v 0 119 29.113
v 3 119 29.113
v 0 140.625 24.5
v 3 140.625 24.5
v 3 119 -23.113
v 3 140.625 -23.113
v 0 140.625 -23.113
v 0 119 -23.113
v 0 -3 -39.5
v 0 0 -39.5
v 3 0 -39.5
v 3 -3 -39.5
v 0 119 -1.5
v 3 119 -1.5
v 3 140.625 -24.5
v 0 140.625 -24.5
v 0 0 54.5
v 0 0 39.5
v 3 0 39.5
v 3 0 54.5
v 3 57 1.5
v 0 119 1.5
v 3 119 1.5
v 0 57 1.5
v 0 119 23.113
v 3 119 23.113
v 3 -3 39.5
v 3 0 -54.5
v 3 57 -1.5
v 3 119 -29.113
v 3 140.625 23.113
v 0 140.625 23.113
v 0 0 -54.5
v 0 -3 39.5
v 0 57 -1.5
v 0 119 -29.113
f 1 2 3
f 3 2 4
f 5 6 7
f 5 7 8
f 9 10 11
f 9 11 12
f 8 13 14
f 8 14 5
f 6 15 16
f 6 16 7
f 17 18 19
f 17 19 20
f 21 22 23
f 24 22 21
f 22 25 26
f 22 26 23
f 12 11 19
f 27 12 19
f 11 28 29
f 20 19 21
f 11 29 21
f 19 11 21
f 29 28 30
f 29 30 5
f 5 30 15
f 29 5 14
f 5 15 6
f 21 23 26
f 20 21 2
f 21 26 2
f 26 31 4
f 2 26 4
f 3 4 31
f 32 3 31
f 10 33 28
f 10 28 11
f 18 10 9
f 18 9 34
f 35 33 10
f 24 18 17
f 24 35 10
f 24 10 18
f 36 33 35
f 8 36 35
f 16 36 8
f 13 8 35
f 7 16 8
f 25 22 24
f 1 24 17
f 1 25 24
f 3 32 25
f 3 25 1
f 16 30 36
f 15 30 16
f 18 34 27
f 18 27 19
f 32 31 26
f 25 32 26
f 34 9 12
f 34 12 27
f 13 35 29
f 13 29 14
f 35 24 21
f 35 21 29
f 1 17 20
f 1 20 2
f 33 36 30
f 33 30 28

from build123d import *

# Parameters (mm, degrees)
EXTRUDE_1_DEPTH     = 3
BOSS_EXTRUDE1_DEPTH = 3


with BuildPart() as part:
    # Эскиз1 → Бобышка-Вытянуть1 (new body)
    with BuildSketch(Plane(origin=(0, 0, 0), x_dir=(0, 0, -1), z_dir=(1, 0, 0))):
        Polygon((29.113333333, 119), (54.5, 0), (39.5, 0), (39.5, -3), (-39.5, -3), (-39.5, 0), (-54.5, 0), (-29.113333333, 119), (-1.5, 119), (-1.5, 57), (1.5, 57), (1.5, 119), align=None)
    extrude(amount=EXTRUDE_1_DEPTH)

    # Sketch1 → Boss-Extrude1 (add)
    with BuildSketch(Plane(origin=(3, 0, 0), x_dir=(0, 0, -1), z_dir=(1, 0, 0))):
        Polygon((-29.113333333, 119), (-24.5, 140.625), (-23.113333333, 140.625), (-23.113333333, 119), align=None)
        Polygon((29.113333333, 119), (24.5, 140.625), (23.113333333, 140.625), (23.113333333, 119), align=None)
    extrude(amount=-BOSS_EXTRUDE1_DEPTH)


solid = part.part
